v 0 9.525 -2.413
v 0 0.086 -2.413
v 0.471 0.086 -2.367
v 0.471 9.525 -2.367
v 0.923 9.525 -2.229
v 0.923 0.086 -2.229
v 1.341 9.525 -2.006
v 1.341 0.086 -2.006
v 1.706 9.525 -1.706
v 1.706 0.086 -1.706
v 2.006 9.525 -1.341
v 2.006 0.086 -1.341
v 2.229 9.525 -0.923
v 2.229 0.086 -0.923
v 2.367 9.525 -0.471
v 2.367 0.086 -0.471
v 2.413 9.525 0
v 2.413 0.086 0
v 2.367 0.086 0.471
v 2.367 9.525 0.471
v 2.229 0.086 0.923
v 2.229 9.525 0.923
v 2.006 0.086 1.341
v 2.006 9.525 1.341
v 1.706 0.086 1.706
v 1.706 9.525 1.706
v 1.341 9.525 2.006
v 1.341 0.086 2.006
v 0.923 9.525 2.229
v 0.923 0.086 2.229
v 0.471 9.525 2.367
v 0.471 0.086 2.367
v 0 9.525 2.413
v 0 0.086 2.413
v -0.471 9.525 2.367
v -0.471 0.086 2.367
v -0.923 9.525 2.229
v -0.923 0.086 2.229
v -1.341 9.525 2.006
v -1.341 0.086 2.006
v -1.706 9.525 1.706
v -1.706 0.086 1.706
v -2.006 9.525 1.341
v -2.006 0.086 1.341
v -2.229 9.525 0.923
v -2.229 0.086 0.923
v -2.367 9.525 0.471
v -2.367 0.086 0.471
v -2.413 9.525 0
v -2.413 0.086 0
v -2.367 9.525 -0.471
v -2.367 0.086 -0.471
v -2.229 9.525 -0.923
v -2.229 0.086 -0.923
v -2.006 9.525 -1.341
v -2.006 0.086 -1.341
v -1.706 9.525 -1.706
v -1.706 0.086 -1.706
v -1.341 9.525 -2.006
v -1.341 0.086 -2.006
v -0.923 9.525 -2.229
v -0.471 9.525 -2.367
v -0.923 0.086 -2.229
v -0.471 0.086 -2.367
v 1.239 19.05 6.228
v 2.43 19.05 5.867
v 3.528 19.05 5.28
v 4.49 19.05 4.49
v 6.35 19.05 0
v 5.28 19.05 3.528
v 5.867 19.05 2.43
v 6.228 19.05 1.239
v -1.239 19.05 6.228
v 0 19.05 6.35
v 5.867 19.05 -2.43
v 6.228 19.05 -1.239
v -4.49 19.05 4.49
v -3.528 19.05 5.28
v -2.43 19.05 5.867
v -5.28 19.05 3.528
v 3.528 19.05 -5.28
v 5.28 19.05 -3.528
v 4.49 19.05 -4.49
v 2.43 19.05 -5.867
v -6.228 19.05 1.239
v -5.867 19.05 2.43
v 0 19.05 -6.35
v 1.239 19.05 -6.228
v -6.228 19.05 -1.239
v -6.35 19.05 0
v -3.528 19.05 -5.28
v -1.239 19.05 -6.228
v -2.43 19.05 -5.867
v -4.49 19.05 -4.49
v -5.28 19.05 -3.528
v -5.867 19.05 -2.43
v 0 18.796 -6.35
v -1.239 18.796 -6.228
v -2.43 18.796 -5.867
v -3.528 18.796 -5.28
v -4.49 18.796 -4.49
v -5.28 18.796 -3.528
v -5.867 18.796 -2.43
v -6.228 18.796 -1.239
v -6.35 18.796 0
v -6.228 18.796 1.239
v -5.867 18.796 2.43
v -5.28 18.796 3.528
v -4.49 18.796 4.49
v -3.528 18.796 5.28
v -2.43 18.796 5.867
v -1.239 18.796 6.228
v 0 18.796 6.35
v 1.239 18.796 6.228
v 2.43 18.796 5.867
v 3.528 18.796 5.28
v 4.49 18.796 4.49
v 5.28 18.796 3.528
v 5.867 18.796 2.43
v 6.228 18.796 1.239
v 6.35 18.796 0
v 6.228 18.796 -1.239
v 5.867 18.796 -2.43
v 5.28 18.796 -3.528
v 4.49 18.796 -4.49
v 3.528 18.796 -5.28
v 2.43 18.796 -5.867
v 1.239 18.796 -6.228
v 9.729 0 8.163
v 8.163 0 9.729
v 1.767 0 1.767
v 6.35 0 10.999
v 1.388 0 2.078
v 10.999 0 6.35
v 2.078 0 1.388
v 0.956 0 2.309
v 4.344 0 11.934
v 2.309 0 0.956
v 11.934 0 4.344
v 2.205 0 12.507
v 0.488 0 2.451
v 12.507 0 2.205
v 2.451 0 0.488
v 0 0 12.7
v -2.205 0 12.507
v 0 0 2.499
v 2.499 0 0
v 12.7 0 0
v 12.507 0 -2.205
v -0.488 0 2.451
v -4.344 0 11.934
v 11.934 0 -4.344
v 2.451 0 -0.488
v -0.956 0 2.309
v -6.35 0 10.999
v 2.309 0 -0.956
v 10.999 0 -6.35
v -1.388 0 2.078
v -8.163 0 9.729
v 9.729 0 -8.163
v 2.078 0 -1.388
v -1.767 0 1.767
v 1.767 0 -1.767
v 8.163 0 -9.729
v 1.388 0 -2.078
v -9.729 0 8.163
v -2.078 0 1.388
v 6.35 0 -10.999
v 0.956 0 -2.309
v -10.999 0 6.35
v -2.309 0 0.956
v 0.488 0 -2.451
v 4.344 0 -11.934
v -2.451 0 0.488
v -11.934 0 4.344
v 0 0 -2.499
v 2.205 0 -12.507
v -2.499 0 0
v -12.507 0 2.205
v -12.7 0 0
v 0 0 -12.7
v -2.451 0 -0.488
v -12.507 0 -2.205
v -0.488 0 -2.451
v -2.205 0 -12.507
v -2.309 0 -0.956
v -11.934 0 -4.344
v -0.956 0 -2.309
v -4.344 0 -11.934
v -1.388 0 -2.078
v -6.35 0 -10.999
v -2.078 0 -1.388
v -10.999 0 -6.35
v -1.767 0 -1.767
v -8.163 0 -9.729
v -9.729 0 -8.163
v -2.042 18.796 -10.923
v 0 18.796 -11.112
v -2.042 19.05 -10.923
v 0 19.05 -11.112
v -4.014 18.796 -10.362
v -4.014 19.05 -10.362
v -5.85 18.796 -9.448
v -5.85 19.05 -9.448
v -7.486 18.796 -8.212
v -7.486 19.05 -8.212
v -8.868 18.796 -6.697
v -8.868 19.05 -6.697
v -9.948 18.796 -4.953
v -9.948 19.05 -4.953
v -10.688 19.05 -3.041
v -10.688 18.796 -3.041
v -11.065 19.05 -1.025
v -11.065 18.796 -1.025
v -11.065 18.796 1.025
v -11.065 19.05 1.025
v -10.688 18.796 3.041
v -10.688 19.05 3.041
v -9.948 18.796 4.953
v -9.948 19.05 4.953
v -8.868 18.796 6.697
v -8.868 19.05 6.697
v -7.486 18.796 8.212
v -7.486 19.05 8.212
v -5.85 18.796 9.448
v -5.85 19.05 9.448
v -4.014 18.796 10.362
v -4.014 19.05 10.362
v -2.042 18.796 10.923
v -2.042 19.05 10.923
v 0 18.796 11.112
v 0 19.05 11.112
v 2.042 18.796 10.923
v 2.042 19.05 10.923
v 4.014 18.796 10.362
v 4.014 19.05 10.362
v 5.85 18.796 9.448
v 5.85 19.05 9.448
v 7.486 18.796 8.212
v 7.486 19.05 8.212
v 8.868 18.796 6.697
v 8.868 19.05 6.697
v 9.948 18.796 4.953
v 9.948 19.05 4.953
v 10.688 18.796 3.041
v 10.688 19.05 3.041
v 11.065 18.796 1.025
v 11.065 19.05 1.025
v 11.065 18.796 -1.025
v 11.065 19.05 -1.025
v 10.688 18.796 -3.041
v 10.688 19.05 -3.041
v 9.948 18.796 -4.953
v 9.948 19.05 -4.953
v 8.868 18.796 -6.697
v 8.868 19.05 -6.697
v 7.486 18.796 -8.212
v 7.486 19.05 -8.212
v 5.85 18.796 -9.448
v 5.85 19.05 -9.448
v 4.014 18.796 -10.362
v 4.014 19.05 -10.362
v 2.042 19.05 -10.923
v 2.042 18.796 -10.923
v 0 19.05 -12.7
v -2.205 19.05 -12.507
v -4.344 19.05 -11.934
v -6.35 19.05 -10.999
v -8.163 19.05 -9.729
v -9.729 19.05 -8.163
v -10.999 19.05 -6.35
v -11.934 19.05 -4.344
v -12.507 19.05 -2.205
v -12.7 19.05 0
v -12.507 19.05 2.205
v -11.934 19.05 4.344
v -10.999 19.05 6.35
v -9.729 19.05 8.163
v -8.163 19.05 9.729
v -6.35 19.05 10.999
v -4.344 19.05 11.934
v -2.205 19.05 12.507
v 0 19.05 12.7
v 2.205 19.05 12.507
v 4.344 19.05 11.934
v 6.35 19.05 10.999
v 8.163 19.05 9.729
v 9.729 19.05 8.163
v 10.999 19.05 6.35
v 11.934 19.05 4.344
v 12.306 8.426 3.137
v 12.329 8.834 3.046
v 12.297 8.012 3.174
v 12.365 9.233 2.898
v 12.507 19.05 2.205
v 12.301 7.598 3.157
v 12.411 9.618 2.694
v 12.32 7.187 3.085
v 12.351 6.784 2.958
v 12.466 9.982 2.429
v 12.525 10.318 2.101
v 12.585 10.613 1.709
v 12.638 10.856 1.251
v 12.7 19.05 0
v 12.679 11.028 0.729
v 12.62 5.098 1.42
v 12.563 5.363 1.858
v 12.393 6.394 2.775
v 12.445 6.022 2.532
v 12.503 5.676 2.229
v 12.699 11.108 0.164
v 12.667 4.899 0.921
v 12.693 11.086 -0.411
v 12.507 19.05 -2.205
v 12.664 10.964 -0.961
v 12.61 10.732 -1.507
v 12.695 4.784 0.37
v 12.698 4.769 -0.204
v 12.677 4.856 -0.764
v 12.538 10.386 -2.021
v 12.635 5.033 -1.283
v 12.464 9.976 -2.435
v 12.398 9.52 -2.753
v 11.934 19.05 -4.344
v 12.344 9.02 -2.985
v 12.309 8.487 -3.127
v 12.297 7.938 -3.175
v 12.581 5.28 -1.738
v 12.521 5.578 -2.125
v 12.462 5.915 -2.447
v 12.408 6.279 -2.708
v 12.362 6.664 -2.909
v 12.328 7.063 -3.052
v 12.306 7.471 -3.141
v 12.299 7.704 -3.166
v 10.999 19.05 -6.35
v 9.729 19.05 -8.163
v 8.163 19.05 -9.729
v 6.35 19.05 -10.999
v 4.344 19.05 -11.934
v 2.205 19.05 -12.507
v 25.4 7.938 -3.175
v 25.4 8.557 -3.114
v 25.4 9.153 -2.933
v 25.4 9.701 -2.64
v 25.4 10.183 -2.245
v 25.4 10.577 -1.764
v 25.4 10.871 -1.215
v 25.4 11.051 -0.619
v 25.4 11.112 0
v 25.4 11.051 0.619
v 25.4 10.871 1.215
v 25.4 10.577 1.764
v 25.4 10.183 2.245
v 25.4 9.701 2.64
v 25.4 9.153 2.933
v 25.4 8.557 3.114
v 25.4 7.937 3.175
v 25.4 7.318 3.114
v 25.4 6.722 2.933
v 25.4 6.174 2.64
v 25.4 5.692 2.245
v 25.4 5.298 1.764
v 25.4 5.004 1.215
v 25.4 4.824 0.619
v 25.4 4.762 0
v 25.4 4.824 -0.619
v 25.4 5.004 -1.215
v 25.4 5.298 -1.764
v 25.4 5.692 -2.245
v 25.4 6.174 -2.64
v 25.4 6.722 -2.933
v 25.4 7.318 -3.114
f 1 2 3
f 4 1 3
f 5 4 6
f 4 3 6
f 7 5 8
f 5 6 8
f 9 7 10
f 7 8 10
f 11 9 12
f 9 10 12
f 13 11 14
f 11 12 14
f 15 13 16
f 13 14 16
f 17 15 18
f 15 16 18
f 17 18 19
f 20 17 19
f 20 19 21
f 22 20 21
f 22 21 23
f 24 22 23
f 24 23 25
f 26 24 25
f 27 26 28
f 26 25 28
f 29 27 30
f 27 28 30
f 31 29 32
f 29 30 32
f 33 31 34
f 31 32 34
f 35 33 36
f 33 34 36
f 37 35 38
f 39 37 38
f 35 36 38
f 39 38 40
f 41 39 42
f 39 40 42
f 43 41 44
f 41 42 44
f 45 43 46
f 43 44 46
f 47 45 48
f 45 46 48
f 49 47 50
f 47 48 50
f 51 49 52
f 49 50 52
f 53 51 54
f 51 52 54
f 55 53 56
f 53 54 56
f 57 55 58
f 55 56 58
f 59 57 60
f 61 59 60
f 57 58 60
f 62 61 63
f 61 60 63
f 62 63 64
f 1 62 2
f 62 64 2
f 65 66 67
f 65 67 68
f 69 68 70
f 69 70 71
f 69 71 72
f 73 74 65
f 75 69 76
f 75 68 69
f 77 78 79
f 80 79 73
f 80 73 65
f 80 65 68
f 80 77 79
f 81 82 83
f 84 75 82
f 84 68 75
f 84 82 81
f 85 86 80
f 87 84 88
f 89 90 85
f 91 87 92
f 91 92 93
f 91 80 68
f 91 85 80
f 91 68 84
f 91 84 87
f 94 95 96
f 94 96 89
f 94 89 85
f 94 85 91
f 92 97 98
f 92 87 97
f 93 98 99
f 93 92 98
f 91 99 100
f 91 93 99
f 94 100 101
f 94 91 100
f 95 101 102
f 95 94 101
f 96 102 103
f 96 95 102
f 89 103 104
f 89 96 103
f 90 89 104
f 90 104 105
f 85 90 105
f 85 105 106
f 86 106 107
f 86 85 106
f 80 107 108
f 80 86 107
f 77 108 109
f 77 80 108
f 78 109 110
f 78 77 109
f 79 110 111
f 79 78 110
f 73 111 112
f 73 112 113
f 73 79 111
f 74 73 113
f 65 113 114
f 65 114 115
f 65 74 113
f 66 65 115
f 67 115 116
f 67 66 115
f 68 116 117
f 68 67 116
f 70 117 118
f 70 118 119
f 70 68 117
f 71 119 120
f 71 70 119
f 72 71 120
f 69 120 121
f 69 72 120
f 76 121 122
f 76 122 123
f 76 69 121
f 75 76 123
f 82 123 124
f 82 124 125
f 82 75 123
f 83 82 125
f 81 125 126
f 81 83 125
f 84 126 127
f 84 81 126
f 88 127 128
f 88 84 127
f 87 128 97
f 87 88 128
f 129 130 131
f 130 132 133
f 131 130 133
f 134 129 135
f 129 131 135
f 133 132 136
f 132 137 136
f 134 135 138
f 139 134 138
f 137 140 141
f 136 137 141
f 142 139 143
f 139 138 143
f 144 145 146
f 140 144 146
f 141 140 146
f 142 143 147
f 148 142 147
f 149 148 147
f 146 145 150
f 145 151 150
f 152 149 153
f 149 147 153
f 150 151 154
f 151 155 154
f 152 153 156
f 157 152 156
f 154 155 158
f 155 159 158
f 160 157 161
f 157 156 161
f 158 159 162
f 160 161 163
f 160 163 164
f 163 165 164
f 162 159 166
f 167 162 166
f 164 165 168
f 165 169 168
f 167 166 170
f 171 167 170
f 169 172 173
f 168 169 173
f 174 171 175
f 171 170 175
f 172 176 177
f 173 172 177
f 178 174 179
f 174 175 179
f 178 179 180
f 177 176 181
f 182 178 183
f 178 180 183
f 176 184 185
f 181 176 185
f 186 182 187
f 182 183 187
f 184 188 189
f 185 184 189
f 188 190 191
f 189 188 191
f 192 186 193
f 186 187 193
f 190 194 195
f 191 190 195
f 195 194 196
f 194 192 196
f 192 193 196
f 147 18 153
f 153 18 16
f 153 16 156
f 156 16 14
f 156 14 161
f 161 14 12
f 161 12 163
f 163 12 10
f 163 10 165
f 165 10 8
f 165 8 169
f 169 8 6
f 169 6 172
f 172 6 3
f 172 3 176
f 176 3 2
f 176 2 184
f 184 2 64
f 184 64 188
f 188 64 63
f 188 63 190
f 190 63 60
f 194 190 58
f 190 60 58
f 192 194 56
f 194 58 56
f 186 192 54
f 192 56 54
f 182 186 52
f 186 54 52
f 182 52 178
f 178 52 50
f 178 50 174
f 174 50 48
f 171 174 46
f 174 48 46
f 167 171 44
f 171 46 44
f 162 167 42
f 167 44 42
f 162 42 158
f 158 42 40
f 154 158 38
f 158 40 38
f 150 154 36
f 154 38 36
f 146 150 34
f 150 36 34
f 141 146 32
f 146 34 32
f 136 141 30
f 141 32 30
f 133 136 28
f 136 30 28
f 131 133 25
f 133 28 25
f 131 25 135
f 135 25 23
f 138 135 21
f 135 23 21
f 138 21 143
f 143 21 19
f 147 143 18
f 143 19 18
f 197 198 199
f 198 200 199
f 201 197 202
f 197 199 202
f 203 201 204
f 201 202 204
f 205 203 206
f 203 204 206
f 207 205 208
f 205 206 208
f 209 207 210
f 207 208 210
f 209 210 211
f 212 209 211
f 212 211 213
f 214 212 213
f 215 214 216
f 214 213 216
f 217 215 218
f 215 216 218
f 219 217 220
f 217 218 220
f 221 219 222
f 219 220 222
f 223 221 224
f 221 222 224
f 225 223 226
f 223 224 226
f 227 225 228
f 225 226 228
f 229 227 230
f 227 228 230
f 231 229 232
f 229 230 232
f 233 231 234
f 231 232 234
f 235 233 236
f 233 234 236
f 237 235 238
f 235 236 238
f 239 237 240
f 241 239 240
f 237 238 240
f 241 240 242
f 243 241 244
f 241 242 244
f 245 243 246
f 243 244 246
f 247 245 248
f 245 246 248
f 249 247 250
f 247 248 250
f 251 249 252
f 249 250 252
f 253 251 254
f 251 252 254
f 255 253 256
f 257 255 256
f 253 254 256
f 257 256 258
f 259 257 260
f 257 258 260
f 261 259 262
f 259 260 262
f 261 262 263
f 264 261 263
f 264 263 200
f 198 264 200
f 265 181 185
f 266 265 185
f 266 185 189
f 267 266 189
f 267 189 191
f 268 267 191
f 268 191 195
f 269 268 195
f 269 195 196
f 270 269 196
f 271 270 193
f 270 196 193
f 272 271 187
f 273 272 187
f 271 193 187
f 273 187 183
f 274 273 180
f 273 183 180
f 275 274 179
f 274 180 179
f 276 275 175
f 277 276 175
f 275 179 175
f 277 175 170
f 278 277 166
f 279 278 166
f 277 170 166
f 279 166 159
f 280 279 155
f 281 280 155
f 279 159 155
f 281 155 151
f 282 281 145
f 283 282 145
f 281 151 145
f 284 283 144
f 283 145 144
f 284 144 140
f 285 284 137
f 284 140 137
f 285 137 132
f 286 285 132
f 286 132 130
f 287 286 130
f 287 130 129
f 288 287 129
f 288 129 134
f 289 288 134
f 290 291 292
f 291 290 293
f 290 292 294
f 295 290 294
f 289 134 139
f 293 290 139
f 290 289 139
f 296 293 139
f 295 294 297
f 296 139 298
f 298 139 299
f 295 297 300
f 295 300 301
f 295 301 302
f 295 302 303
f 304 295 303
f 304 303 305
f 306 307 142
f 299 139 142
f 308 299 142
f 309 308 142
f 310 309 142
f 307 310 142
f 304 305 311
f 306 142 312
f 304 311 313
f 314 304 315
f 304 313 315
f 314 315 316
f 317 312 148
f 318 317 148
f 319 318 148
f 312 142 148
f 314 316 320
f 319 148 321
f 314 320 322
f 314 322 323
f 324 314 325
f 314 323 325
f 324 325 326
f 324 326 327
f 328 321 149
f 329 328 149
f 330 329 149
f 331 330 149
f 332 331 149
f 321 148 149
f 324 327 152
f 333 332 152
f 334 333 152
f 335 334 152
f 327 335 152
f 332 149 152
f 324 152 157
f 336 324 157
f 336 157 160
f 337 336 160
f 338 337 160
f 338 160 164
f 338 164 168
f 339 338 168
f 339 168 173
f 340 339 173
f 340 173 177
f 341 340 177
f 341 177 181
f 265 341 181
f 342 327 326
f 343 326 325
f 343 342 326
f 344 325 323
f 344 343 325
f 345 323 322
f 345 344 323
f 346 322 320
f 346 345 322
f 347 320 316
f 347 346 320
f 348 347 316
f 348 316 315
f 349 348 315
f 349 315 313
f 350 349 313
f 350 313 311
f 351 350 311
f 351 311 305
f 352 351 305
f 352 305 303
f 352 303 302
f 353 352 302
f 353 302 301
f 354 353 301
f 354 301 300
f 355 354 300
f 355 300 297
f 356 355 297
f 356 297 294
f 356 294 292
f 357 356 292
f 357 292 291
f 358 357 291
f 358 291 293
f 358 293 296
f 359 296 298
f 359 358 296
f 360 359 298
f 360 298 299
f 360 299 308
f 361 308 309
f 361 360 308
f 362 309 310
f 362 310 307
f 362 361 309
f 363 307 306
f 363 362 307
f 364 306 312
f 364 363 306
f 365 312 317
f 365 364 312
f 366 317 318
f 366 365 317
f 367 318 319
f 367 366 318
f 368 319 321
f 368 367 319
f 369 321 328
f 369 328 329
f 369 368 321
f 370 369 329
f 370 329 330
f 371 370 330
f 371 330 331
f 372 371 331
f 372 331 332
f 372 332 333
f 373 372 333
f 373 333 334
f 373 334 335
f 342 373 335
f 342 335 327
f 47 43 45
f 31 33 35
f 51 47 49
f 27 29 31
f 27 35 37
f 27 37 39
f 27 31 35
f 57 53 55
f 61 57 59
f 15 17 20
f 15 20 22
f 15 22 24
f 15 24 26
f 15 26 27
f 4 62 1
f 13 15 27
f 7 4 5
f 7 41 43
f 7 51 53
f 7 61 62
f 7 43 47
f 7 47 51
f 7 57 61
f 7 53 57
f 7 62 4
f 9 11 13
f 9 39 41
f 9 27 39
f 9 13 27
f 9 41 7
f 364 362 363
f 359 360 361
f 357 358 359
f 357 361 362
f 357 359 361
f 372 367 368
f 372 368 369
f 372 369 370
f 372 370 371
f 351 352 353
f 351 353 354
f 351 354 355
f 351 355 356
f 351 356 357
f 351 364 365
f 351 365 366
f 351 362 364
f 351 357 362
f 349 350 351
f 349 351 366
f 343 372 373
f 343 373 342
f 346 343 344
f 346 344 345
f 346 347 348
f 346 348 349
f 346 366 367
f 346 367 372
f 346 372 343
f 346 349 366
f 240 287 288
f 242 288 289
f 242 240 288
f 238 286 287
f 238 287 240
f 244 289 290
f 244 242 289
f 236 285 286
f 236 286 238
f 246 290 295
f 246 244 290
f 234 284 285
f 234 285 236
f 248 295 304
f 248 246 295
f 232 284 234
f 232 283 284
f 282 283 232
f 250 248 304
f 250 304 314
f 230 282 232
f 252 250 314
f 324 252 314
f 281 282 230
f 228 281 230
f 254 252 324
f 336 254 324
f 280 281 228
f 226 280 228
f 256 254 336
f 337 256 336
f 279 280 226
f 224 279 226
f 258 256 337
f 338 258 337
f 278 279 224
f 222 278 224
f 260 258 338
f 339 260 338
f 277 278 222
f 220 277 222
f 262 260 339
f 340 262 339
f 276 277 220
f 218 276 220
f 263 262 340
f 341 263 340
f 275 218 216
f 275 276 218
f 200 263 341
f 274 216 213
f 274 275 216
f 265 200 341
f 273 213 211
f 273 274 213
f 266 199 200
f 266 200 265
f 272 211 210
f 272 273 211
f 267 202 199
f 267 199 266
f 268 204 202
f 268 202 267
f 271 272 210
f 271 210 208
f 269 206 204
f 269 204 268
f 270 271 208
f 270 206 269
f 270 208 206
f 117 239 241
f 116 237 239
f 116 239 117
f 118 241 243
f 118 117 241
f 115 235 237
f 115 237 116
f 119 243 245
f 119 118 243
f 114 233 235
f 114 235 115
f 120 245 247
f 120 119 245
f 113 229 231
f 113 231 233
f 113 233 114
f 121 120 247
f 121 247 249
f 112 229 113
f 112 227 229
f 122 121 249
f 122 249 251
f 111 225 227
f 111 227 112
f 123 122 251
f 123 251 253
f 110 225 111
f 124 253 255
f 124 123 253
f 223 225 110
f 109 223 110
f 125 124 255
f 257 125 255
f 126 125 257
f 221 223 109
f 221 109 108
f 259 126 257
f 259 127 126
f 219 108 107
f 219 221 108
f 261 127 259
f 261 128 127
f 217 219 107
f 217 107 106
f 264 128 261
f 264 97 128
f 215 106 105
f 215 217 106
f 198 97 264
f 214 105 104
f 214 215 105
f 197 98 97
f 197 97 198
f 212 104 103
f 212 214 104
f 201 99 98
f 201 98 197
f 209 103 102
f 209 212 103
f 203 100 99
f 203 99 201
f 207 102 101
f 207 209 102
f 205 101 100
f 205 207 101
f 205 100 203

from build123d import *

# Parameters (mm, degrees)
SKETCH1_R           = 12.7
BOSS_EXTRUDE1_DEPTH = 19.05
SKETCH2_W           = 4.7625
SKETCH2_H           = 0.254
SKETCH3_R           = 2.413
CUT_EXTRUDE1_DEPTH  = 9.525
BOSS_EXTRUDE2_START = 25.4
SKETCH7_R           = 3.175
BOSS_EXTRUDE2_DEPTH = 13.103277876


# Read off the part's stored shape, not the designer's step: Cut-Extrude2
with BuildPart() as part:
    # Sketch1 → Boss-Extrude1 (new body)
    with BuildSketch(Plane(origin=(0, 0, 0), x_dir=(1, 0, 0), z_dir=(0, 1, 0))):
        with Locations(Location((0, 0, 0), (0, 0, 90))):
            Circle(SKETCH1_R)
    extrude(amount=BOSS_EXTRUDE1_DEPTH)

    # Sketch2 → Cut-Revolve1 (revolve, cut)
    with BuildSketch(Plane.XY, mode=Mode.PRIVATE) as cut_revolve1_sk:
        with Locations((-8.73125, 18.923)):
            Rectangle(SKETCH2_W, SKETCH2_H)
    revolve(cut_revolve1_sk.sketch.rotate(Axis((0, 0, 0), (0, 1, 0)), 270), axis=Axis((0, 0, 0), (0, 1, 0)), mode=Mode.SUBTRACT)

    # Sketch3 → Cut-Extrude1 (cut)
    with BuildSketch(Plane.XZ):
        with Locations(Location((0, 0, 0), (0, 0, 270))):
            Circle(SKETCH3_R)
    extrude(amount=-CUT_EXTRUDE1_DEPTH, mode=Mode.SUBTRACT)

    # Cut-Extrude2 outline → Cut-Extrude2 (revolve, cut)
    with BuildSketch(Plane.XY):
        Polygon((2.498925958, 0), (2.413, 0.085925958), (2.413, 0), align=None)
    revolve(axis=Axis((0, 0, 0), (0, 1, 0)), mode=Mode.SUBTRACT)

    # Sketch7 → Boss-Extrude2 (add)
    with BuildSketch(Plane(origin=(0, 0, 0), x_dir=(0, 0, -1), z_dir=(1, 0, 0)).offset(BOSS_EXTRUDE2_START)):
        with Locations((0, 7.9375)):
            Circle(SKETCH7_R)
    extrude(amount=-BOSS_EXTRUDE2_DEPTH)


solid = part.part
